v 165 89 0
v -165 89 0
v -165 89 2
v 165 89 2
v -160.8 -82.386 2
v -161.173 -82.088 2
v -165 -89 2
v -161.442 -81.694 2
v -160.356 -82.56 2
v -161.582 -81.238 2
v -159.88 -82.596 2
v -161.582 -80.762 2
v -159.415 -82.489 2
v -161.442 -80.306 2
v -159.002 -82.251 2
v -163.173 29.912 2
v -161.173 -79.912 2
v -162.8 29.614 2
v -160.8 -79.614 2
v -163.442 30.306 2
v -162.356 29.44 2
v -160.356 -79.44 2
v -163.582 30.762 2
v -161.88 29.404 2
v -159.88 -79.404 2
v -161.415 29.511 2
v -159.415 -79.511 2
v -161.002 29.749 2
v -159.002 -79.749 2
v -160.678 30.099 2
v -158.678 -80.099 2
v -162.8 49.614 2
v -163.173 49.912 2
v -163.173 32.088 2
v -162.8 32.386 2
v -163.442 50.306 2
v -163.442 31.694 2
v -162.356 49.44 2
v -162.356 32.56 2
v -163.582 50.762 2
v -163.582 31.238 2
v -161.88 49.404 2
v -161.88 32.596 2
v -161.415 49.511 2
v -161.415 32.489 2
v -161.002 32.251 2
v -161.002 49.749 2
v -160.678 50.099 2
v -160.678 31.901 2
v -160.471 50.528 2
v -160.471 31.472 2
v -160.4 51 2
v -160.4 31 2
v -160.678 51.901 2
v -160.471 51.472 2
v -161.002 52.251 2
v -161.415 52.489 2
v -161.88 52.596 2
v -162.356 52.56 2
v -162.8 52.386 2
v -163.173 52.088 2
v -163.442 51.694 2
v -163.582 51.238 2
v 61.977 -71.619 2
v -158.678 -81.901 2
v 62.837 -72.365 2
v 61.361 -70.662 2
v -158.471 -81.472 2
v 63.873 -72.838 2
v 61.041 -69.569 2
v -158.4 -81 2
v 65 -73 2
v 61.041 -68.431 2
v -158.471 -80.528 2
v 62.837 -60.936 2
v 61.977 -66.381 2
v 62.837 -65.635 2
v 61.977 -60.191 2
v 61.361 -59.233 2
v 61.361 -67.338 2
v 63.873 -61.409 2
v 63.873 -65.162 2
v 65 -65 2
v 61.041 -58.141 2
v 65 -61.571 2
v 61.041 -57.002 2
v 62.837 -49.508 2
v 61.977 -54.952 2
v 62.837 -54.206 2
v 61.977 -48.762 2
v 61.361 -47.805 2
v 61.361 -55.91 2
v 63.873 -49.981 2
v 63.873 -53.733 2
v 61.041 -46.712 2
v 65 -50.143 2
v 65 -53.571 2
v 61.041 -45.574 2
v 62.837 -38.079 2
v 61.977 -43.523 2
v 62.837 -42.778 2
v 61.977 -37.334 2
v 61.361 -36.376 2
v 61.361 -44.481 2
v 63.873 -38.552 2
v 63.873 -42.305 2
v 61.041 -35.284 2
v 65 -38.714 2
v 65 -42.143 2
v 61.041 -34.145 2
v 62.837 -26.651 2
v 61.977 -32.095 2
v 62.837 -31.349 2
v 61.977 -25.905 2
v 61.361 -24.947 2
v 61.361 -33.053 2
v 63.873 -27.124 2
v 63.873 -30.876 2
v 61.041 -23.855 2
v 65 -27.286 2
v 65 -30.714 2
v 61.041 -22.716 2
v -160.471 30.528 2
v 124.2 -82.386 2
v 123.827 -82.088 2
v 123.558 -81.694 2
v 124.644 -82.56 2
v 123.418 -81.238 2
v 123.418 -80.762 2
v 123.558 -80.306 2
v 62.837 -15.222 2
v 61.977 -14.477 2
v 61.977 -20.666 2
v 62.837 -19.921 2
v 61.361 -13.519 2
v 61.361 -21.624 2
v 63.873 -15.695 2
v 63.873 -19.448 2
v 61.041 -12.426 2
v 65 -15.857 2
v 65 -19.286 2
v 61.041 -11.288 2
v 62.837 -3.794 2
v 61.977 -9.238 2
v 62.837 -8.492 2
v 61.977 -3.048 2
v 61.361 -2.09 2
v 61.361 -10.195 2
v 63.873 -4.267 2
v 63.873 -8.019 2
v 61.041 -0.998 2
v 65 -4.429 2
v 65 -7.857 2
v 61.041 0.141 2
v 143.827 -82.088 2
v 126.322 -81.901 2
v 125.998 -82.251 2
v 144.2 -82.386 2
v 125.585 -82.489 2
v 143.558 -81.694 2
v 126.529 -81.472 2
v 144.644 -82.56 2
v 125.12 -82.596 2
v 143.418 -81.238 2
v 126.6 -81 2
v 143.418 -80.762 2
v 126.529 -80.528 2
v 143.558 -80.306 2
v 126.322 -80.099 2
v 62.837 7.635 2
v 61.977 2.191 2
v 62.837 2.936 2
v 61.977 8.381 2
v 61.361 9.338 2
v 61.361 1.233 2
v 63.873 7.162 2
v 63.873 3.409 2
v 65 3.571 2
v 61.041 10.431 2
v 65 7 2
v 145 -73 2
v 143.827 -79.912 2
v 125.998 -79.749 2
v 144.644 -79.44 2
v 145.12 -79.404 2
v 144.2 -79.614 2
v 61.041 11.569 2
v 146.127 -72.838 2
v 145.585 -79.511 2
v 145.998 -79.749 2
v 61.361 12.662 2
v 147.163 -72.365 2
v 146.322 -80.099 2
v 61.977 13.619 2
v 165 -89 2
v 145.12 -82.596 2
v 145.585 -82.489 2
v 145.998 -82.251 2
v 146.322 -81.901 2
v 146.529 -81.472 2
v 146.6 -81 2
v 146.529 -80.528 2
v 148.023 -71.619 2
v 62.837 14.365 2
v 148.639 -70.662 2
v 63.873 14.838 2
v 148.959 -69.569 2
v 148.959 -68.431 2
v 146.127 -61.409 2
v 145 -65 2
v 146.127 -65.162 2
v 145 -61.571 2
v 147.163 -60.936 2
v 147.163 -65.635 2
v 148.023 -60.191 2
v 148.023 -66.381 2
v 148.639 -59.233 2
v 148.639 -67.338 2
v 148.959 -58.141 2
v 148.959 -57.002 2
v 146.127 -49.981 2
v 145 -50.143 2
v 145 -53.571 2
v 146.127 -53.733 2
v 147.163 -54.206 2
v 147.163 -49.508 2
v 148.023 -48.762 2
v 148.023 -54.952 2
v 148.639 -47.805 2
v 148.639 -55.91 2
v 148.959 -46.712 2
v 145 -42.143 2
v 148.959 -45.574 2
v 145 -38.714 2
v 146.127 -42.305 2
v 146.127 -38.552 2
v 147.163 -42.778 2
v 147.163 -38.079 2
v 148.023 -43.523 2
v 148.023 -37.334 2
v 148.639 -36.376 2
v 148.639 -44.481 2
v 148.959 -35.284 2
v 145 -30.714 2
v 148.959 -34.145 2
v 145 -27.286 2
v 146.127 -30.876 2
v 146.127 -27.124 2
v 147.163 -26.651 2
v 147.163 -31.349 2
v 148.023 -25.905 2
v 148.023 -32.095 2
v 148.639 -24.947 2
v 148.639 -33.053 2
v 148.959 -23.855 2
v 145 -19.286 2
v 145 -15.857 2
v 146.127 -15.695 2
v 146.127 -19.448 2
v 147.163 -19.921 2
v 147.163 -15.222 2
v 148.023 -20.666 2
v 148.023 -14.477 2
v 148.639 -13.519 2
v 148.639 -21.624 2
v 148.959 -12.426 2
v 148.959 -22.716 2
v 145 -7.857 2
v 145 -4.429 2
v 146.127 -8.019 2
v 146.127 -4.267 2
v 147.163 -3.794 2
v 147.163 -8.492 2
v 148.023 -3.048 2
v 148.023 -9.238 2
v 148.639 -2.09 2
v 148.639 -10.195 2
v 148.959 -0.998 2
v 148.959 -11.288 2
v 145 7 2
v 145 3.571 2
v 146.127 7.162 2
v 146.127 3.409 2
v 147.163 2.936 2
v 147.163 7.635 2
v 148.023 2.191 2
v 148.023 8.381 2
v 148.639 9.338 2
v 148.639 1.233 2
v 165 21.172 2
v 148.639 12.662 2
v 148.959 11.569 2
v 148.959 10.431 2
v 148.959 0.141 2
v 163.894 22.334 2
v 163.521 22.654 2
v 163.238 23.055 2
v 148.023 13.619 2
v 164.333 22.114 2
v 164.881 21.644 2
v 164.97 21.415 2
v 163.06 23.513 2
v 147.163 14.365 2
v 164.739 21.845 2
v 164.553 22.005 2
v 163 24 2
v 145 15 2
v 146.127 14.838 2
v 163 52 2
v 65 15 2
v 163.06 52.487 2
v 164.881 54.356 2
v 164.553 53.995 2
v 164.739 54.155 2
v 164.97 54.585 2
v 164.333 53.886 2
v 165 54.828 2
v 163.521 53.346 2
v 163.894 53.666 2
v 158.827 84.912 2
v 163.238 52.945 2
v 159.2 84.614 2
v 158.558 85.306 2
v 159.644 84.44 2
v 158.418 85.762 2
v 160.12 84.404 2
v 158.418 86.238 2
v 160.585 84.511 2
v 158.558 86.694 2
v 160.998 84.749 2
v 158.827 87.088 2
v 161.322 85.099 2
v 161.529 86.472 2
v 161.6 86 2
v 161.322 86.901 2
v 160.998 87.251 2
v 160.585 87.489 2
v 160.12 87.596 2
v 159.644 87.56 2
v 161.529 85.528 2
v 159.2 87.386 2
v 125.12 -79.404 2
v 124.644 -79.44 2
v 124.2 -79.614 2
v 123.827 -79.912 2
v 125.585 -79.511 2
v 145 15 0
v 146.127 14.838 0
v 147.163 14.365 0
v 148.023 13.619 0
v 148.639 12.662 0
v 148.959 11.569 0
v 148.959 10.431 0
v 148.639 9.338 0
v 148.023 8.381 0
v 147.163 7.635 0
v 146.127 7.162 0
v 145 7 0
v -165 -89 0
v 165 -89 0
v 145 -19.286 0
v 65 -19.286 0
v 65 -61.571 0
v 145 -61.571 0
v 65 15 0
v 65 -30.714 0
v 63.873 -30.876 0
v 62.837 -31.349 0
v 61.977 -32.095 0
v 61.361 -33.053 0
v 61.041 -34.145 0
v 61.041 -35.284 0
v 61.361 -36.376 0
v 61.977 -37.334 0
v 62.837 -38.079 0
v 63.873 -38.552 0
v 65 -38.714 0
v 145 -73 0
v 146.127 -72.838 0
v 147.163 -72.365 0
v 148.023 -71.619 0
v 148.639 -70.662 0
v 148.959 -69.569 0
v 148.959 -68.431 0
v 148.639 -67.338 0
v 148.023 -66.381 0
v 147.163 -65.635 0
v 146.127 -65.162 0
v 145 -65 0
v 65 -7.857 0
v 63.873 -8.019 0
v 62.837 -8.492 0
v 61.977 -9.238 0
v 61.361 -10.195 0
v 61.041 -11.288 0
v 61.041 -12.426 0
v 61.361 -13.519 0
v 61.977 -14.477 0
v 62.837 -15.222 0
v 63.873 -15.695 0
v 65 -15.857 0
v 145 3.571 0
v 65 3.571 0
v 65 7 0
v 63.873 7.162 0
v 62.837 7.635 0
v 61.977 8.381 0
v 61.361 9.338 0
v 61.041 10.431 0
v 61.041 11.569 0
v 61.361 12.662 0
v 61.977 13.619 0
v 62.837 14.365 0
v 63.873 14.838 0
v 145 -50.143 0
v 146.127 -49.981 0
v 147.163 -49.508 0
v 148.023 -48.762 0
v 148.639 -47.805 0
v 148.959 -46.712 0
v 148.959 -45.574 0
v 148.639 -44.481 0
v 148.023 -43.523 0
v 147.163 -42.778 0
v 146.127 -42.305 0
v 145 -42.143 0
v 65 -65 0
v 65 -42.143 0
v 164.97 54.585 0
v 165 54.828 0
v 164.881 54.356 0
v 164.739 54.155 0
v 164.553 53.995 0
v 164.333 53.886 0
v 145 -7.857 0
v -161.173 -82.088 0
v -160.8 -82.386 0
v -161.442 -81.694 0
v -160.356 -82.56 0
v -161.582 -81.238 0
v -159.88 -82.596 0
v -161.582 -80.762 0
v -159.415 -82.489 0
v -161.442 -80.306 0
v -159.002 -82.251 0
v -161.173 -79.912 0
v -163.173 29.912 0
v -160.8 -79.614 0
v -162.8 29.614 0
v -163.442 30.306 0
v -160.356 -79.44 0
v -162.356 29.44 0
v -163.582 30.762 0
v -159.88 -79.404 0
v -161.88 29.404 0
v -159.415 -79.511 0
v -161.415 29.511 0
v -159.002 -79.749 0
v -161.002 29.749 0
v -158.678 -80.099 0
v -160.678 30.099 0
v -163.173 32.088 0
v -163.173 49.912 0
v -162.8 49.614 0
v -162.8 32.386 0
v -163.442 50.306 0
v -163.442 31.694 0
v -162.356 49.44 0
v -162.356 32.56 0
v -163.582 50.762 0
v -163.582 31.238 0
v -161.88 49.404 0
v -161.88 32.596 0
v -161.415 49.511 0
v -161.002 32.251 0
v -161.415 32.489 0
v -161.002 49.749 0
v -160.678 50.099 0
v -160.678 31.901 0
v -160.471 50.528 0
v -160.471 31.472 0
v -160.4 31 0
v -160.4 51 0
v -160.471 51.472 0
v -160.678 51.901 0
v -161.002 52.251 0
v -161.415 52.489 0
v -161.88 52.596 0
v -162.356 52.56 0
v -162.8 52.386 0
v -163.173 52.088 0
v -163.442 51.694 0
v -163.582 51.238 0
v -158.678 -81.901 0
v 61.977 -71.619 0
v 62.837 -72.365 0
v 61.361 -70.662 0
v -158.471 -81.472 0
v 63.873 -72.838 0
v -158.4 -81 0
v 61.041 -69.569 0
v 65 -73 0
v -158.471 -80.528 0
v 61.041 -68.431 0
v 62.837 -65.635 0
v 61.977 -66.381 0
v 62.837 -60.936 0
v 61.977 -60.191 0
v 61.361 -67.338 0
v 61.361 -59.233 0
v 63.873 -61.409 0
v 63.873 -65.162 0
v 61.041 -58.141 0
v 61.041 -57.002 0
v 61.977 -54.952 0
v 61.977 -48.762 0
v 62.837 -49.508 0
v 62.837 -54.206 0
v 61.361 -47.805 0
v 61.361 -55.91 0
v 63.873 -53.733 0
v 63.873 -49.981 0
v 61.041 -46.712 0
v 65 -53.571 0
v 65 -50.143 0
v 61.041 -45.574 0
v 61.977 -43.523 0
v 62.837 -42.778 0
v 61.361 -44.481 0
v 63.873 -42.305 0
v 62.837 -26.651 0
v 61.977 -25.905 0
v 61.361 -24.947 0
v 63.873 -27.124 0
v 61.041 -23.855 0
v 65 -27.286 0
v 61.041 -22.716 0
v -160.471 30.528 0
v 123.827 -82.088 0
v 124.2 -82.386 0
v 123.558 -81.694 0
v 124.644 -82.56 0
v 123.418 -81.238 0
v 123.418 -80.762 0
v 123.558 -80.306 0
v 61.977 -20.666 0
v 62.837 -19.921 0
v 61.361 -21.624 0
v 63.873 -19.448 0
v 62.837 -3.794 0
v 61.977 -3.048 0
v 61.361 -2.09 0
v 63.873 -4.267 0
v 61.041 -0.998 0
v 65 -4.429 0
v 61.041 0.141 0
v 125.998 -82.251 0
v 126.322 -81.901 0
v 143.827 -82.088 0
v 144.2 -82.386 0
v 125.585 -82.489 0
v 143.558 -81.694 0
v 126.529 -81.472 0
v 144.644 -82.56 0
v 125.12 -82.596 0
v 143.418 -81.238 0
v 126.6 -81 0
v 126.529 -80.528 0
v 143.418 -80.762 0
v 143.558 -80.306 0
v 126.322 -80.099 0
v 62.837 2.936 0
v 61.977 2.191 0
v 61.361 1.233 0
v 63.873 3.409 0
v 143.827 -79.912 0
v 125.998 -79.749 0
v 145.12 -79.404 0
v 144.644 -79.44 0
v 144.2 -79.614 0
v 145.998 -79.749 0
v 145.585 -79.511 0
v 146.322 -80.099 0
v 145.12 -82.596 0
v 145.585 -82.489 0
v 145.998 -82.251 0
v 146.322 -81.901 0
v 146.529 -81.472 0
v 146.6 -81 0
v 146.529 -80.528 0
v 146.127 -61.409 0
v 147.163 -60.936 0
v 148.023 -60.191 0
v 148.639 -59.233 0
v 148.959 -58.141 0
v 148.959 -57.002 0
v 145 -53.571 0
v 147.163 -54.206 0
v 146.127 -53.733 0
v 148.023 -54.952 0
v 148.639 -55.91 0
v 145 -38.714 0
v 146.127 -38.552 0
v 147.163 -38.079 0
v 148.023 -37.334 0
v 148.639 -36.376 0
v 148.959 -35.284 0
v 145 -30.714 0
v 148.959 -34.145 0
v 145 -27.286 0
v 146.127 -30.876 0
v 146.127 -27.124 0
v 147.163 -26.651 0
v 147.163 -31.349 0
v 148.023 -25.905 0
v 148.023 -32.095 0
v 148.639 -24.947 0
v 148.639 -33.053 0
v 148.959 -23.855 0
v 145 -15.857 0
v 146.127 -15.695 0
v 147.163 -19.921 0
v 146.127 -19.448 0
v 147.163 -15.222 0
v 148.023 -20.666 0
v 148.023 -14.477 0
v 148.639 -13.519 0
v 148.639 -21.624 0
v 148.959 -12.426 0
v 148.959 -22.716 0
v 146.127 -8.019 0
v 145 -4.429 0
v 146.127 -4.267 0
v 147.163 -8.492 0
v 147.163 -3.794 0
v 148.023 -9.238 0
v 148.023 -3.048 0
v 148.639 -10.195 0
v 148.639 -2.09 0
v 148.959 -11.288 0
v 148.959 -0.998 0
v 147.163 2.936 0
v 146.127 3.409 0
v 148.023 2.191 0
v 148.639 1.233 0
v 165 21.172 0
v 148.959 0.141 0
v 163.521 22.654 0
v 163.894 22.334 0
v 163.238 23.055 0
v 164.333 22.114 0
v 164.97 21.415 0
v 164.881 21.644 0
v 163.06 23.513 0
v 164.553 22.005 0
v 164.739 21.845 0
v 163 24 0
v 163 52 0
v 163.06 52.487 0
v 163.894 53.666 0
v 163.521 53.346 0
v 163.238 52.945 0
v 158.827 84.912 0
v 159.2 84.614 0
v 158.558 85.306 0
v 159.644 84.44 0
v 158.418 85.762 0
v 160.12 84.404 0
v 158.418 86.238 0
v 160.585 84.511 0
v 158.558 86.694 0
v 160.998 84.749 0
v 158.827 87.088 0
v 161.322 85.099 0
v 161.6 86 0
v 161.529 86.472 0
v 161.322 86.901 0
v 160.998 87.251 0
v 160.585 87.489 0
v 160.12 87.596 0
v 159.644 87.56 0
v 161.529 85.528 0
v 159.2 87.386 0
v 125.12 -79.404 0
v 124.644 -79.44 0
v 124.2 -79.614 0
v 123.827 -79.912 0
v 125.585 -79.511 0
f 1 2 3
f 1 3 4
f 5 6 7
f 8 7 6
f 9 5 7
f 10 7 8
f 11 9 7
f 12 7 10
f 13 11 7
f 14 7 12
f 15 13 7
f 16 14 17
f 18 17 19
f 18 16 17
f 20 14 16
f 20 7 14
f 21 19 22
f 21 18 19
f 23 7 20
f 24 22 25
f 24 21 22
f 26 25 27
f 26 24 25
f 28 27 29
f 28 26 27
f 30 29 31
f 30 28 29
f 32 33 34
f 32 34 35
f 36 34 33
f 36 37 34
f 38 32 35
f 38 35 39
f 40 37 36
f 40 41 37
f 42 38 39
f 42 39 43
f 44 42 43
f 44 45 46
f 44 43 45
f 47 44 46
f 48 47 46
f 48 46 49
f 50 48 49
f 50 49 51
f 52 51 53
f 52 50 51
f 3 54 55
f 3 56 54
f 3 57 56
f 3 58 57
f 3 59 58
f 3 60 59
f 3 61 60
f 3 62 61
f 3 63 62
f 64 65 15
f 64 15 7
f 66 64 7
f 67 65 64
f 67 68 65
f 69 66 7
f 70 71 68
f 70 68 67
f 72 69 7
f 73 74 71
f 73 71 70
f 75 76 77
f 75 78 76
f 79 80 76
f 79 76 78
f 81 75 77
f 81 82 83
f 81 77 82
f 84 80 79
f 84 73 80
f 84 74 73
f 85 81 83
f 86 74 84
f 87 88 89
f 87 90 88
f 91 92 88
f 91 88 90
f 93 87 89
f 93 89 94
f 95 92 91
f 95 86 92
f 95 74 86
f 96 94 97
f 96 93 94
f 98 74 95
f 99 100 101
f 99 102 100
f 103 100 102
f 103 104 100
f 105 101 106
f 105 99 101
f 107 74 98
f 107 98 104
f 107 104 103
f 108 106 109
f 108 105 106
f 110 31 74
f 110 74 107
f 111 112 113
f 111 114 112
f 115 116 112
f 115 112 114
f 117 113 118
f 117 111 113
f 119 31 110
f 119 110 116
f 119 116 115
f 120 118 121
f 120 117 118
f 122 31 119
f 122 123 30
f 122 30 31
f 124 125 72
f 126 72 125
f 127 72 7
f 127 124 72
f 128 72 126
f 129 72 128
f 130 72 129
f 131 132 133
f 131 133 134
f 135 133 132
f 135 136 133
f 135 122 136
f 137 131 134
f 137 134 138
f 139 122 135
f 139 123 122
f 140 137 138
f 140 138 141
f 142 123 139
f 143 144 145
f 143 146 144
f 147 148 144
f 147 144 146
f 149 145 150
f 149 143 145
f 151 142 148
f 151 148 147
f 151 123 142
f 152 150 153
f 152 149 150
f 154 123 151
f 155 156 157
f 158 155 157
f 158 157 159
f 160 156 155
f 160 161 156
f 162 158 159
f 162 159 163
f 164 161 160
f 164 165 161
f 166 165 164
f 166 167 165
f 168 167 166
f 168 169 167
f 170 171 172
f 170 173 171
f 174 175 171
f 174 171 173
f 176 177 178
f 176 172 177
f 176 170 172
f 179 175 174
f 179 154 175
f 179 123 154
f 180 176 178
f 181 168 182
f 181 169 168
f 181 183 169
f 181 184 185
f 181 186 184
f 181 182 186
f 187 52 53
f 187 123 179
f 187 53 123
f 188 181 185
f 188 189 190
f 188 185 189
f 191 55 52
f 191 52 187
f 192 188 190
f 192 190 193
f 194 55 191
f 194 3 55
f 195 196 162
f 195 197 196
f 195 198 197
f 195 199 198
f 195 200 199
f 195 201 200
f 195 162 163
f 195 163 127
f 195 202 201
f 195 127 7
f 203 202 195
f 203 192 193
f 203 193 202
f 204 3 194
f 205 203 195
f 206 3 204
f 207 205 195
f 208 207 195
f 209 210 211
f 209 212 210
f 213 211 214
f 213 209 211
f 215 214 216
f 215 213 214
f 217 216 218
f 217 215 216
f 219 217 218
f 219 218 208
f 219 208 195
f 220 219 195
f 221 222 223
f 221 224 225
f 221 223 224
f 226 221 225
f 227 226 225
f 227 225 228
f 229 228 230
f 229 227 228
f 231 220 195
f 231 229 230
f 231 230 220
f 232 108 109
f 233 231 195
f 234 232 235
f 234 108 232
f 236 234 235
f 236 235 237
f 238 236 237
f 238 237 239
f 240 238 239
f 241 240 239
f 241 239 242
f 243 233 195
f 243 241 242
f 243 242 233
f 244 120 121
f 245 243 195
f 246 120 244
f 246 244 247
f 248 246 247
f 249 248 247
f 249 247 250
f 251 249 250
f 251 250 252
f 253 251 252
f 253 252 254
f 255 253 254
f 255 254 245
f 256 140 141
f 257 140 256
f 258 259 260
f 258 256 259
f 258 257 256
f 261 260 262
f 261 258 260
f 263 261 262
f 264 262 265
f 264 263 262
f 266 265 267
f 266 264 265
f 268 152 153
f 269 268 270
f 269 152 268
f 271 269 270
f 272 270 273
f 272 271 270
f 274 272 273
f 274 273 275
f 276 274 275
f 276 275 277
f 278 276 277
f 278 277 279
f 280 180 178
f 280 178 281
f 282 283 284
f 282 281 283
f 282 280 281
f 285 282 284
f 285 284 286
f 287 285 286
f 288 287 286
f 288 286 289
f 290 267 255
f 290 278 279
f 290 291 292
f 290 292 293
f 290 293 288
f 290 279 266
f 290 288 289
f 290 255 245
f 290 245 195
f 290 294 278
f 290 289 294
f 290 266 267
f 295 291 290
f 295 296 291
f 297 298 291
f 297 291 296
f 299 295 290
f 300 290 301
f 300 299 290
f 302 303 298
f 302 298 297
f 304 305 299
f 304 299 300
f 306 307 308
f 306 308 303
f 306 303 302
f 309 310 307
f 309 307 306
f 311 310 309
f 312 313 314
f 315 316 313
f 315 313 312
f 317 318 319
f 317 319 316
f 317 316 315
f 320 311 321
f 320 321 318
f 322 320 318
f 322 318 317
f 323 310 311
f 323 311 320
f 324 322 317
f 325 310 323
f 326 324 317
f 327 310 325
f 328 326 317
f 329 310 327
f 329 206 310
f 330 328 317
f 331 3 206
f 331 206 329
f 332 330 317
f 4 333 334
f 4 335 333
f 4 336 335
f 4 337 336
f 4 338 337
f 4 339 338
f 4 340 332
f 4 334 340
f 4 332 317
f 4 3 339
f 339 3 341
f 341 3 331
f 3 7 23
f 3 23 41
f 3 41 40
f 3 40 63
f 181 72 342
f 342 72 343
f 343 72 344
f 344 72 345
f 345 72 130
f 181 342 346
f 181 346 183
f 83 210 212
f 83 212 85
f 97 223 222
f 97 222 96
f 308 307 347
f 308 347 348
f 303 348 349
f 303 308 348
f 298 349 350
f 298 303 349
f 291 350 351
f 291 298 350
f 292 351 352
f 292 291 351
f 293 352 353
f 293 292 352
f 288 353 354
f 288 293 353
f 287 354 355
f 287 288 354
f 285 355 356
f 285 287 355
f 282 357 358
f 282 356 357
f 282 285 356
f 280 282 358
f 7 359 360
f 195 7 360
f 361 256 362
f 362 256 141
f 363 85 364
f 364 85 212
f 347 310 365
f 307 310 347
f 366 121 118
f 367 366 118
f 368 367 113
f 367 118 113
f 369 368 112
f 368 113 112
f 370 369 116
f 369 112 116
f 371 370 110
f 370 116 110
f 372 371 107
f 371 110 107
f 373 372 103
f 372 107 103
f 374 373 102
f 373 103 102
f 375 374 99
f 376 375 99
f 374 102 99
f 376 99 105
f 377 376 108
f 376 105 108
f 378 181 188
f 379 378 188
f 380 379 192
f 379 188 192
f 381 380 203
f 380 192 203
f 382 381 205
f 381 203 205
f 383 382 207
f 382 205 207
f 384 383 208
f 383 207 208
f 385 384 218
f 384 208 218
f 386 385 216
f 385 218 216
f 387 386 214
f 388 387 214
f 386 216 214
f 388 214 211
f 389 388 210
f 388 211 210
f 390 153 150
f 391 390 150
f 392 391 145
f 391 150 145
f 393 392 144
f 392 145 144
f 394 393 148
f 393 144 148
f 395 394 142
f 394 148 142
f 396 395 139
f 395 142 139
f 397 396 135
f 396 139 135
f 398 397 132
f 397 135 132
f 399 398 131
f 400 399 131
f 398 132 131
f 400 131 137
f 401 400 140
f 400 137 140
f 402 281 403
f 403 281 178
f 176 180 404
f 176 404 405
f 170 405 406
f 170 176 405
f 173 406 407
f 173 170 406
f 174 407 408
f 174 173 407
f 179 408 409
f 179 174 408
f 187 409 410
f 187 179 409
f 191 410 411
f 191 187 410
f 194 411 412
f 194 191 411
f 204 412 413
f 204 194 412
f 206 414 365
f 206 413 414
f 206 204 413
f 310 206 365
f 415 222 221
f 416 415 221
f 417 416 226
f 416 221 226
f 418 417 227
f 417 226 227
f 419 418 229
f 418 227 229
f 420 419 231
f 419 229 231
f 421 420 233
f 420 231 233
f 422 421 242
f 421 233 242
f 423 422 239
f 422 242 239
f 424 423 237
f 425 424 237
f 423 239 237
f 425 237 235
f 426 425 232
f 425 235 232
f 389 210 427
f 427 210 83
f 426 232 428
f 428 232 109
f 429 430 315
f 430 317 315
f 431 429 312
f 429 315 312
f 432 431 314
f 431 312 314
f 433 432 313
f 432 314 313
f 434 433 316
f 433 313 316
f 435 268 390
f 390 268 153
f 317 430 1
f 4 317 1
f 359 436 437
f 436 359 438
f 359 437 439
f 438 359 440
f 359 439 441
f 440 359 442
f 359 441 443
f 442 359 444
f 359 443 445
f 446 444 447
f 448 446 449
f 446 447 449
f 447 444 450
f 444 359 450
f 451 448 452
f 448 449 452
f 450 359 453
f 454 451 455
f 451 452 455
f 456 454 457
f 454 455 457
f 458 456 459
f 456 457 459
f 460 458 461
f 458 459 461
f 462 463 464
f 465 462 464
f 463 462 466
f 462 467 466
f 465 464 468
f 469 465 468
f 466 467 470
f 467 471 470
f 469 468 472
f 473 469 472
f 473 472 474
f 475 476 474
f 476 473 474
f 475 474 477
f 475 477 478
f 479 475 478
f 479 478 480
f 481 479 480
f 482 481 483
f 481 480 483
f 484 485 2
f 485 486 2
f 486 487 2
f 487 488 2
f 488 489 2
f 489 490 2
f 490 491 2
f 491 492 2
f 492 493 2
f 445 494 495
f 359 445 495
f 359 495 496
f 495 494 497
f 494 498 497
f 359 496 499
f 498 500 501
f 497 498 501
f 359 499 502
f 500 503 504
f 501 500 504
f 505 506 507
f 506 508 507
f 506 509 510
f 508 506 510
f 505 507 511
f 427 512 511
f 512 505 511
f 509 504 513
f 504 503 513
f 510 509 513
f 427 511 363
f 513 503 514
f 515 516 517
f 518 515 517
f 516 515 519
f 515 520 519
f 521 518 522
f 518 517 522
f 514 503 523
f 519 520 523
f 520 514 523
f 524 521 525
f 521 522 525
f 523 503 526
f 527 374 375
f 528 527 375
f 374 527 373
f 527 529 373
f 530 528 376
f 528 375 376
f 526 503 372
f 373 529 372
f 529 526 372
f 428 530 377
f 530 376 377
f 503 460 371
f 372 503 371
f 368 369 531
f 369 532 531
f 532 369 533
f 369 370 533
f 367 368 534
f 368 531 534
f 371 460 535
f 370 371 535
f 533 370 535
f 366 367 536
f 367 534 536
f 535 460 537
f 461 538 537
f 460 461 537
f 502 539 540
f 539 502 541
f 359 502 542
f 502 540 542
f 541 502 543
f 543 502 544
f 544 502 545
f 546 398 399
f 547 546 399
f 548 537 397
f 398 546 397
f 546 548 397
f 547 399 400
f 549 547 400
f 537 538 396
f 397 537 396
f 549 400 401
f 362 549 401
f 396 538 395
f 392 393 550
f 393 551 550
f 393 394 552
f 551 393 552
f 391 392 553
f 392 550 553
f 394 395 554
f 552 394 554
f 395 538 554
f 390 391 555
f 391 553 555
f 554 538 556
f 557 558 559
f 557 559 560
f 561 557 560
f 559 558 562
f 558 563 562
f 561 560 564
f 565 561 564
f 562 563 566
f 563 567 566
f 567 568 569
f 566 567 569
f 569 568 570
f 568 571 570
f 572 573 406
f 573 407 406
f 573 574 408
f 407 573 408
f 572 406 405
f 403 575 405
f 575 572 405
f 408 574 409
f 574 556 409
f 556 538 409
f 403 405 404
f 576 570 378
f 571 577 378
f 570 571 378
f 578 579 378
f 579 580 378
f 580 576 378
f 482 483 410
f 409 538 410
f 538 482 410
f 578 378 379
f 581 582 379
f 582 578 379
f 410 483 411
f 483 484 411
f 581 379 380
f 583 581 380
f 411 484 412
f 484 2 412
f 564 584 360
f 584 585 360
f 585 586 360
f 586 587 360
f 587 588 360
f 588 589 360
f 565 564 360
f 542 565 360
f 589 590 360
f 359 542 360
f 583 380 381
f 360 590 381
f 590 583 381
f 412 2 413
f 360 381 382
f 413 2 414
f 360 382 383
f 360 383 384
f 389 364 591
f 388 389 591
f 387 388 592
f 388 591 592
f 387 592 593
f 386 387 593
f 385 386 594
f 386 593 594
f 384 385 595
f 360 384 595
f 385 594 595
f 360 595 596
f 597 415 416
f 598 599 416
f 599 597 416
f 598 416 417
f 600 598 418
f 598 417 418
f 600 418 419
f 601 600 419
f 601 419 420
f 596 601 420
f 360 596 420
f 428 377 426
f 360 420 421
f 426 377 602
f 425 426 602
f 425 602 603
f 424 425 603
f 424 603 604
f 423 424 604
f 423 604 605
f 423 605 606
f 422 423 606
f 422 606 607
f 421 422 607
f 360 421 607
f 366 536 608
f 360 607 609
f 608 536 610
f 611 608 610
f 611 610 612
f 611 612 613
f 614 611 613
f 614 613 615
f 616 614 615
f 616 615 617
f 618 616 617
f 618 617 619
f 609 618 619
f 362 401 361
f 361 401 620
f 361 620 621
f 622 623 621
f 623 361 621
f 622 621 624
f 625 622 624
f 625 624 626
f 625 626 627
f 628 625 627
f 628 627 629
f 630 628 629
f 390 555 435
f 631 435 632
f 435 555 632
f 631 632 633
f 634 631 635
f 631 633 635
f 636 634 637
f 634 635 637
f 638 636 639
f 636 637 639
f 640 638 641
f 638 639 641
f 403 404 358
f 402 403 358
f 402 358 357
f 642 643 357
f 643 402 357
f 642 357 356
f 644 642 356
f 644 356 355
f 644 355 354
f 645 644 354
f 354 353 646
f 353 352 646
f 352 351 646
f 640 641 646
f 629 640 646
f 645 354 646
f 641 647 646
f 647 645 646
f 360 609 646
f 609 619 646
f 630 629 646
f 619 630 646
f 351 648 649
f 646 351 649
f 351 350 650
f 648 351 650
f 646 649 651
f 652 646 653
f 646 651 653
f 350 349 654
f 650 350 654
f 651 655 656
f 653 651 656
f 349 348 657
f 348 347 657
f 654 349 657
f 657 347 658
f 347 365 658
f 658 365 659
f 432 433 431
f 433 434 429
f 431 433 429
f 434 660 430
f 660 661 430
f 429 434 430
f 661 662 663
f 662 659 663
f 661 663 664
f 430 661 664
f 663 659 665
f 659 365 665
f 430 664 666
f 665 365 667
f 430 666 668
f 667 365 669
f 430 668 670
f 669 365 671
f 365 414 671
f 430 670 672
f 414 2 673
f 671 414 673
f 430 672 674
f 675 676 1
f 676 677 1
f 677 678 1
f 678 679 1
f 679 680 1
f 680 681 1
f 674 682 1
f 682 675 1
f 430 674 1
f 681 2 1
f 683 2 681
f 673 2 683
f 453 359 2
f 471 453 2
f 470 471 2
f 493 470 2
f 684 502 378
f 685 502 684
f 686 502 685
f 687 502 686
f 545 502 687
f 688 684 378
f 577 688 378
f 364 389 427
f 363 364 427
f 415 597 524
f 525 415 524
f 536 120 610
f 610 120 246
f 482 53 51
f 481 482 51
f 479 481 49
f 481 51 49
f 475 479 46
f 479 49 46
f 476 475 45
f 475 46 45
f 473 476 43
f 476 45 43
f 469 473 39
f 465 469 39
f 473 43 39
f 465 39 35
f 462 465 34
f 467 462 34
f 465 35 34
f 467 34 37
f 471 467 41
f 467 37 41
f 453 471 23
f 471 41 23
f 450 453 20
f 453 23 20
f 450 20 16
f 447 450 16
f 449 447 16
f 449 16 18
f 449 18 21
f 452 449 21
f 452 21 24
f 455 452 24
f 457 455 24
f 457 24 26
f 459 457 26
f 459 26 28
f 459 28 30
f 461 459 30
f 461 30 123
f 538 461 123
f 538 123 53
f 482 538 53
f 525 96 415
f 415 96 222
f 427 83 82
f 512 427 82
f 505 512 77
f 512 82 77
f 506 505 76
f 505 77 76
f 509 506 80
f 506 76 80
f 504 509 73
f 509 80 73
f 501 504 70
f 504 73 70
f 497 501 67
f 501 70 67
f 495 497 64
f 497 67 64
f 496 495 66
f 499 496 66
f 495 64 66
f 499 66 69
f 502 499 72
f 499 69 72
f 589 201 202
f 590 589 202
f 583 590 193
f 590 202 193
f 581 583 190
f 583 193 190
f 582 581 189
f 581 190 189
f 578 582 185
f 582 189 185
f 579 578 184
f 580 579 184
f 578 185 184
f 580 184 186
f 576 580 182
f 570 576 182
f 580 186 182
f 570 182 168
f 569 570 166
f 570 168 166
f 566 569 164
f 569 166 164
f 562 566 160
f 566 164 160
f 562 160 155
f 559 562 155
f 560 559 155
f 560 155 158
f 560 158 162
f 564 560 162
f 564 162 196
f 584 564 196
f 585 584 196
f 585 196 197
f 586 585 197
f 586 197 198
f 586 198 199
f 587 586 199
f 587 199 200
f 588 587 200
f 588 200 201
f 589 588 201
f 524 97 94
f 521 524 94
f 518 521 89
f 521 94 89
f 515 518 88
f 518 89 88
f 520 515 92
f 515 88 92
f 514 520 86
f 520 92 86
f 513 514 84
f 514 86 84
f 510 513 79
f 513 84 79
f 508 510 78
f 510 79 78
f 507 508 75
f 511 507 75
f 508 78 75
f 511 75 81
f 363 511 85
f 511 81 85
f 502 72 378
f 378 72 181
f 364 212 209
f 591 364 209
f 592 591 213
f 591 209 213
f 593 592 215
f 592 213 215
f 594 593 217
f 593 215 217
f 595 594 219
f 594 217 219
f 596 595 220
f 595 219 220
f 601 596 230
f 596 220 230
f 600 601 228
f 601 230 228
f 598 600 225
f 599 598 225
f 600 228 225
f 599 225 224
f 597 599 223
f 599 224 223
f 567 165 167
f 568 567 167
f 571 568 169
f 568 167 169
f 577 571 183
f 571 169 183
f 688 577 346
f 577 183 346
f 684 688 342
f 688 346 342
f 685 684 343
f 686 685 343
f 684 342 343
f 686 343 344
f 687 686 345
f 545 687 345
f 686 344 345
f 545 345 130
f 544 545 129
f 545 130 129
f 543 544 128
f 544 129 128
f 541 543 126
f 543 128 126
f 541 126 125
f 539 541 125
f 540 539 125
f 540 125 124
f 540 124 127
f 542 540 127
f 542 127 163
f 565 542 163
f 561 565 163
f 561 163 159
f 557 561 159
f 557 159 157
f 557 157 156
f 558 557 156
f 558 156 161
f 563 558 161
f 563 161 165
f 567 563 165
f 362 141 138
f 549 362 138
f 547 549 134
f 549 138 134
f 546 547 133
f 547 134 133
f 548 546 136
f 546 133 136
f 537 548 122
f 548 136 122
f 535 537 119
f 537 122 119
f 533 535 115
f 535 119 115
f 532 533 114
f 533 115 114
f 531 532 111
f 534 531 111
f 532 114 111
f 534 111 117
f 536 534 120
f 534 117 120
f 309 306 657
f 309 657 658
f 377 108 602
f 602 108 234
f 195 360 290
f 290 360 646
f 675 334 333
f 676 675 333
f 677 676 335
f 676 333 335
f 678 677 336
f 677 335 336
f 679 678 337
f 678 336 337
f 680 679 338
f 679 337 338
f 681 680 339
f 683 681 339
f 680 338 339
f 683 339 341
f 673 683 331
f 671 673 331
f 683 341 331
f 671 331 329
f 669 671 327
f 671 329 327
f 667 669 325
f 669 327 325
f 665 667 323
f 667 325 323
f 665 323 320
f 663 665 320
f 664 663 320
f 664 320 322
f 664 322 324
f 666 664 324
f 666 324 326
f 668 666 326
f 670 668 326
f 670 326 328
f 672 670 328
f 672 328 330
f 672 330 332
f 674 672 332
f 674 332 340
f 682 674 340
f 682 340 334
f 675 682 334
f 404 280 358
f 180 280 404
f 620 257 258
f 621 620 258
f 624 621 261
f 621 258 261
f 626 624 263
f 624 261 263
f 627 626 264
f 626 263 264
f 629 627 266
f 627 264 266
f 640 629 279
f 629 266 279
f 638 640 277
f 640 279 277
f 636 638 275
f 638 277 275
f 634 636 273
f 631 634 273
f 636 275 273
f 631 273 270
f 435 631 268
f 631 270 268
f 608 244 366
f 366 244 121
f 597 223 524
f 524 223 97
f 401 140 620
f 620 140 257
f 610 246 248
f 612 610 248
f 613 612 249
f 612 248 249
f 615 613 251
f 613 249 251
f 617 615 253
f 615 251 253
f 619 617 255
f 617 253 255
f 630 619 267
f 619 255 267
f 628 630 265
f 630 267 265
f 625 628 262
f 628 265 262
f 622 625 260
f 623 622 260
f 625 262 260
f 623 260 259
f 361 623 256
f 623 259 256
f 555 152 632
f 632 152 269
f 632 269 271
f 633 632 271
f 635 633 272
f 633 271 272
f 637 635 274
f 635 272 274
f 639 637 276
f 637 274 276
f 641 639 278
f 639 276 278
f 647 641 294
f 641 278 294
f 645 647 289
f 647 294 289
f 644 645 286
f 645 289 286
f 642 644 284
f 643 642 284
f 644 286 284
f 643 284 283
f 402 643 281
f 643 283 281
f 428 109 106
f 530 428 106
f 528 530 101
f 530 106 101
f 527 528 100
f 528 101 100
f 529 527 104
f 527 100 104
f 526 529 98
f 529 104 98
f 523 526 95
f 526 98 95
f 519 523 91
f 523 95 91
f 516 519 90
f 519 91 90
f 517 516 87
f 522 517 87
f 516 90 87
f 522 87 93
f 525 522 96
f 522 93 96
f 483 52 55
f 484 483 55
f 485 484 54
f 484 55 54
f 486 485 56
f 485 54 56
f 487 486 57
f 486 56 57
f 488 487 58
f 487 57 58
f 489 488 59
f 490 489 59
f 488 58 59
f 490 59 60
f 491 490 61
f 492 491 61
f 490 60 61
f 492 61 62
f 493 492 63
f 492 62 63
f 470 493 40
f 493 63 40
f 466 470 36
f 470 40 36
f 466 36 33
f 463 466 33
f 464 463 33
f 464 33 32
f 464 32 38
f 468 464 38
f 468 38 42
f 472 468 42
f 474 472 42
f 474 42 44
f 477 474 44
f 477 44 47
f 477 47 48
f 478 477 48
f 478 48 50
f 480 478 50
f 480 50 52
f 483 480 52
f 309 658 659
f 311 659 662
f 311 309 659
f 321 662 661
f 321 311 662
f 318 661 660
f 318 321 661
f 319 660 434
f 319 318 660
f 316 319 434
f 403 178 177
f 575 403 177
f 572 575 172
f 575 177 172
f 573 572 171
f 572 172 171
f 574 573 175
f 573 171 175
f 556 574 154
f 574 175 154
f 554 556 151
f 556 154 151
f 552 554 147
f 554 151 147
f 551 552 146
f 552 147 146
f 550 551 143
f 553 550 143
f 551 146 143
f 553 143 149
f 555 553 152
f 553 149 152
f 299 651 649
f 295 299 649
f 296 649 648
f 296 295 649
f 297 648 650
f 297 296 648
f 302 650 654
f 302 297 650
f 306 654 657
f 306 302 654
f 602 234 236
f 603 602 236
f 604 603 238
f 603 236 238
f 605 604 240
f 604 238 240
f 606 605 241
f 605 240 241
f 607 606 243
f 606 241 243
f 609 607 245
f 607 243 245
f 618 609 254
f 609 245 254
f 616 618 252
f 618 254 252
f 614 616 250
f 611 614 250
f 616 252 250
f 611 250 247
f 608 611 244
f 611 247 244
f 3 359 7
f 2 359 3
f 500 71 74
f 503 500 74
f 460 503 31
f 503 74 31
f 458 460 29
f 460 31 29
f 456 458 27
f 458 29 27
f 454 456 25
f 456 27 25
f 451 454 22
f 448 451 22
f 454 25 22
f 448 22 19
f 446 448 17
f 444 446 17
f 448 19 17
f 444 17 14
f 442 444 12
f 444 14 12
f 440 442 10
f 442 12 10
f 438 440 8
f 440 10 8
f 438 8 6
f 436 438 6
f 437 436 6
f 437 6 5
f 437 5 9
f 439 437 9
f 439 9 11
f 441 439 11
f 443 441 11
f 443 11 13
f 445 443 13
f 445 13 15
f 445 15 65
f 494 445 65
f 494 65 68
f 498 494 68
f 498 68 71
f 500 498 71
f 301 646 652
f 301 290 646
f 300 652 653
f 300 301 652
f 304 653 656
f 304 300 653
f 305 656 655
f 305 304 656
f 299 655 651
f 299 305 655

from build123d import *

# Parameters (mm, degrees)
SKETCH_1_W          = 330
SKETCH_1_H          = 178
EXTRUDE_1_DEPTH     = 2
CUT_EXTRUDE_1_REACH = 189.483
CUT_EXTRUDE_2_REACH = 189.483
SKETCH_3_R          = 1.6
CUT_EXTRUDE_4_DEPTH = 188.483332593
FILLET_1_R          = 1


with BuildPart() as part:
    # 草图1 → 凸台-拉伸1 (new body)
    with BuildSketch(Plane.XY):
        Rectangle(SKETCH_1_W, SKETCH_1_H)
    extrude(amount=EXTRUDE_1_DEPTH)

    # 草图2 → 切除-拉伸1 (cut, up to next)
    with BuildSketch(Plane.XY.offset(2), mode=Mode.PRIVATE) as cut_extrude_1_sk1:
        with BuildLine():
            Line((65, 15), (145, 15))
            ThreePointArc((145, 15), (149, 11), (145, 7))
            Line((145, 7), (65, 7))
            ThreePointArc((65, 7), (61, 11), (65, 15))
        make_face()
    cut_extrude_1_tool1 = extrude(cut_extrude_1_sk1.sketch, amount=-CUT_EXTRUDE_1_REACH, mode=Mode.PRIVATE) & part.part
    # 草图2 → 切除-拉伸1 (cut, up to next)
    with BuildSketch(Plane.XY.offset(2), mode=Mode.PRIVATE) as cut_extrude_1_sk2:
        with BuildLine():
            Line((65, -4.428571429), (145, -4.428571429))
            ThreePointArc((145, -4.428571429), (149, -0.428571429), (145, 3.571428571))
            Line((145, 3.571428571), (65, 3.571428571))
            ThreePointArc((65, 3.571428571), (61, -0.428571429), (65, -4.428571429))
        make_face()
    cut_extrude_1_tool2 = extrude(cut_extrude_1_sk2.sketch, amount=-CUT_EXTRUDE_1_REACH, mode=Mode.PRIVATE) & part.part
    # 草图2 → 切除-拉伸1 (cut, up to next)
    with BuildSketch(Plane.XY.offset(2), mode=Mode.PRIVATE) as cut_extrude_1_sk3:
        with BuildLine():
            Line((65, -15.857142857), (145, -15.857142857))
            ThreePointArc((145, -15.857142857), (149, -11.857142857), (145, -7.857142857))
            Line((145, -7.857142857), (65, -7.857142857))
            ThreePointArc((65, -7.857142857), (61, -11.857142857), (65, -15.857142857))
        make_face()
    cut_extrude_1_tool3 = extrude(cut_extrude_1_sk3.sketch, amount=-CUT_EXTRUDE_1_REACH, mode=Mode.PRIVATE) & part.part
    # 草图2 → 切除-拉伸1 (cut, up to next)
    with BuildSketch(Plane.XY.offset(2), mode=Mode.PRIVATE) as cut_extrude_1_sk4:
        with BuildLine():
            Line((65, -27.285714286), (145, -27.285714286))
            ThreePointArc((145, -27.285714286), (149, -23.285714286), (145, -19.285714286))
            Line((145, -19.285714286), (65, -19.285714286))
            ThreePointArc((65, -19.285714286), (61, -23.285714286), (65, -27.285714286))
        make_face()
    cut_extrude_1_tool4 = extrude(cut_extrude_1_sk4.sketch, amount=-CUT_EXTRUDE_1_REACH, mode=Mode.PRIVATE) & part.part
    # 草图2 → 切除-拉伸1 (cut, up to next)
    with BuildSketch(Plane.XY.offset(2), mode=Mode.PRIVATE) as cut_extrude_1_sk5:
        with BuildLine():
            Line((65, -38.714285714), (145, -38.714285714))
            ThreePointArc((145, -38.714285714), (149, -34.714285714), (145, -30.714285714))
            Line((145, -30.714285714), (65, -30.714285714))
            ThreePointArc((65, -30.714285714), (61, -34.714285714), (65, -38.714285714))
        make_face()
    cut_extrude_1_tool5 = extrude(cut_extrude_1_sk5.sketch, amount=-CUT_EXTRUDE_1_REACH, mode=Mode.PRIVATE) & part.part
    # 草图2 → 切除-拉伸1 (cut, up to next)
    with BuildSketch(Plane.XY.offset(2), mode=Mode.PRIVATE) as cut_extrude_1_sk6:
        with BuildLine():
            Line((65, -50.142857143), (145, -50.142857143))
            ThreePointArc((145, -50.142857143), (149, -46.142857143), (145, -42.142857143))
            Line((145, -42.142857143), (65, -42.142857143))
            ThreePointArc((65, -42.142857143), (61, -46.142857143), (65, -50.142857143))
        make_face()
    cut_extrude_1_tool6 = extrude(cut_extrude_1_sk6.sketch, amount=-CUT_EXTRUDE_1_REACH, mode=Mode.PRIVATE) & part.part
    # 草图2 → 切除-拉伸1 (cut, up to next)
    with BuildSketch(Plane.XY.offset(2), mode=Mode.PRIVATE) as cut_extrude_1_sk7:
        with BuildLine():
            Line((65, -61.571428571), (145, -61.571428571))
            ThreePointArc((145, -61.571428571), (149, -57.571428571), (145, -53.571428571))
            Line((145, -53.571428571), (65, -53.571428571))
            ThreePointArc((65, -53.571428571), (61, -57.571428571), (65, -61.571428571))
        make_face()
    cut_extrude_1_tool7 = extrude(cut_extrude_1_sk7.sketch, amount=-CUT_EXTRUDE_1_REACH, mode=Mode.PRIVATE) & part.part
    # 草图2 → 切除-拉伸1 (cut, up to next)
    with BuildSketch(Plane.XY.offset(2), mode=Mode.PRIVATE) as cut_extrude_1_sk8:
        with BuildLine():
            Line((65, -73), (145, -73))
            ThreePointArc((145, -73), (149, -69), (145, -65))
            Line((145, -65), (65, -65))
            ThreePointArc((65, -65), (61, -69), (65, -73))
        make_face()
    cut_extrude_1_tool8 = extrude(cut_extrude_1_sk8.sketch, amount=-CUT_EXTRUDE_1_REACH, mode=Mode.PRIVATE) & part.part
    add(cut_extrude_1_tool1.solids().sort_by_distance((105, 11, 2))[0], mode=Mode.SUBTRACT)
    add(cut_extrude_1_tool2.solids().sort_by_distance((105, -0.428571, 2))[0], mode=Mode.SUBTRACT)
    add(cut_extrude_1_tool3.solids().sort_by_distance((105, -11.857143, 2))[0], mode=Mode.SUBTRACT)
    add(cut_extrude_1_tool4.solids().sort_by_distance((105, -23.285714, 2))[0], mode=Mode.SUBTRACT)
    add(cut_extrude_1_tool5.solids().sort_by_distance((105, -34.714286, 2))[0], mode=Mode.SUBTRACT)
    add(cut_extrude_1_tool6.solids().sort_by_distance((105, -46.142857, 2))[0], mode=Mode.SUBTRACT)
    add(cut_extrude_1_tool7.solids().sort_by_distance((105, -57.571429, 2))[0], mode=Mode.SUBTRACT)
    add(cut_extrude_1_tool8.solids().sort_by_distance((105, -69, 2))[0], mode=Mode.SUBTRACT)

    # 草图3 → 切除-拉伸2 (cut, up to next)
    with BuildSketch(Plane.XY.offset(2), mode=Mode.PRIVATE) as cut_extrude_2_sk1:
        with Locations((-162, 51)):
            Circle(SKETCH_3_R)
    cut_extrude_2_tool1 = extrude(cut_extrude_2_sk1.sketch, amount=-CUT_EXTRUDE_2_REACH, mode=Mode.PRIVATE) & part.part
    # 草图3 → 切除-拉伸2 (cut, up to next)
    with BuildSketch(Plane.XY.offset(2), mode=Mode.PRIVATE) as cut_extrude_2_sk2:
        with Locations((-162, 31)):
            Circle(SKETCH_3_R)
    cut_extrude_2_tool2 = extrude(cut_extrude_2_sk2.sketch, amount=-CUT_EXTRUDE_2_REACH, mode=Mode.PRIVATE) & part.part
    # 草图3 → 切除-拉伸2 (cut, up to next)
    with BuildSketch(Plane.XY.offset(2), mode=Mode.PRIVATE) as cut_extrude_2_sk3:
        with Locations((-160, -81)):
            Circle(SKETCH_3_R)
    cut_extrude_2_tool3 = extrude(cut_extrude_2_sk3.sketch, amount=-CUT_EXTRUDE_2_REACH, mode=Mode.PRIVATE) & part.part
    # 草图3 → 切除-拉伸2 (cut, up to next)
    with BuildSketch(Plane.XY.offset(2), mode=Mode.PRIVATE) as cut_extrude_2_sk4:
        with Locations((145, -81)):
            Circle(SKETCH_3_R)
    cut_extrude_2_tool4 = extrude(cut_extrude_2_sk4.sketch, amount=-CUT_EXTRUDE_2_REACH, mode=Mode.PRIVATE) & part.part
    # 草图3 → 切除-拉伸2 (cut, up to next)
    with BuildSketch(Plane.XY.offset(2), mode=Mode.PRIVATE) as cut_extrude_2_sk5:
        with Locations((125, -81)):
            Circle(SKETCH_3_R)
    cut_extrude_2_tool5 = extrude(cut_extrude_2_sk5.sketch, amount=-CUT_EXTRUDE_2_REACH, mode=Mode.PRIVATE) & part.part
    # 草图3 → 切除-拉伸2 (cut, up to next)
    with BuildSketch(Plane.XY.offset(2), mode=Mode.PRIVATE) as cut_extrude_2_sk6:
        with Locations((160, 86)):
            Circle(SKETCH_3_R)
    cut_extrude_2_tool6 = extrude(cut_extrude_2_sk6.sketch, amount=-CUT_EXTRUDE_2_REACH, mode=Mode.PRIVATE) & part.part
    add(cut_extrude_2_tool1.solids().sort_by_distance((-162, 51, 2))[0], mode=Mode.SUBTRACT)
    add(cut_extrude_2_tool2.solids().sort_by_distance((-162, 31, 2))[0], mode=Mode.SUBTRACT)
    add(cut_extrude_2_tool3.solids().sort_by_distance((-160, -81, 2))[0], mode=Mode.SUBTRACT)
    add(cut_extrude_2_tool4.solids().sort_by_distance((145, -81, 2))[0], mode=Mode.SUBTRACT)
    add(cut_extrude_2_tool5.solids().sort_by_distance((125, -81, 2))[0], mode=Mode.SUBTRACT)
    add(cut_extrude_2_tool6.solids().sort_by_distance((160, 86, 2))[0], mode=Mode.SUBTRACT)

    # 草图5 → 切除-拉伸4 (cut, through all)
    with BuildSketch(Plane.XY.offset(2)):
        with BuildLine():
            Line((167, 52), (167, 24))
            ThreePointArc((167, 24), (165, 22), (163, 24))
            Line((163, 24), (163, 52))
            ThreePointArc((163, 52), (165, 54), (167, 52))
        make_face()
    extrude(amount=-CUT_EXTRUDE_4_DEPTH, mode=Mode.SUBTRACT)

    # 圆角1
    fillet_1_edges = [part.edges().sort_by_distance(p)[0] for p in [
        (165, 54, 1),
        (165, 22, 1),
    ]]
    fillet(fillet_1_edges, radius=FILLET_1_R)


solid = part.part
